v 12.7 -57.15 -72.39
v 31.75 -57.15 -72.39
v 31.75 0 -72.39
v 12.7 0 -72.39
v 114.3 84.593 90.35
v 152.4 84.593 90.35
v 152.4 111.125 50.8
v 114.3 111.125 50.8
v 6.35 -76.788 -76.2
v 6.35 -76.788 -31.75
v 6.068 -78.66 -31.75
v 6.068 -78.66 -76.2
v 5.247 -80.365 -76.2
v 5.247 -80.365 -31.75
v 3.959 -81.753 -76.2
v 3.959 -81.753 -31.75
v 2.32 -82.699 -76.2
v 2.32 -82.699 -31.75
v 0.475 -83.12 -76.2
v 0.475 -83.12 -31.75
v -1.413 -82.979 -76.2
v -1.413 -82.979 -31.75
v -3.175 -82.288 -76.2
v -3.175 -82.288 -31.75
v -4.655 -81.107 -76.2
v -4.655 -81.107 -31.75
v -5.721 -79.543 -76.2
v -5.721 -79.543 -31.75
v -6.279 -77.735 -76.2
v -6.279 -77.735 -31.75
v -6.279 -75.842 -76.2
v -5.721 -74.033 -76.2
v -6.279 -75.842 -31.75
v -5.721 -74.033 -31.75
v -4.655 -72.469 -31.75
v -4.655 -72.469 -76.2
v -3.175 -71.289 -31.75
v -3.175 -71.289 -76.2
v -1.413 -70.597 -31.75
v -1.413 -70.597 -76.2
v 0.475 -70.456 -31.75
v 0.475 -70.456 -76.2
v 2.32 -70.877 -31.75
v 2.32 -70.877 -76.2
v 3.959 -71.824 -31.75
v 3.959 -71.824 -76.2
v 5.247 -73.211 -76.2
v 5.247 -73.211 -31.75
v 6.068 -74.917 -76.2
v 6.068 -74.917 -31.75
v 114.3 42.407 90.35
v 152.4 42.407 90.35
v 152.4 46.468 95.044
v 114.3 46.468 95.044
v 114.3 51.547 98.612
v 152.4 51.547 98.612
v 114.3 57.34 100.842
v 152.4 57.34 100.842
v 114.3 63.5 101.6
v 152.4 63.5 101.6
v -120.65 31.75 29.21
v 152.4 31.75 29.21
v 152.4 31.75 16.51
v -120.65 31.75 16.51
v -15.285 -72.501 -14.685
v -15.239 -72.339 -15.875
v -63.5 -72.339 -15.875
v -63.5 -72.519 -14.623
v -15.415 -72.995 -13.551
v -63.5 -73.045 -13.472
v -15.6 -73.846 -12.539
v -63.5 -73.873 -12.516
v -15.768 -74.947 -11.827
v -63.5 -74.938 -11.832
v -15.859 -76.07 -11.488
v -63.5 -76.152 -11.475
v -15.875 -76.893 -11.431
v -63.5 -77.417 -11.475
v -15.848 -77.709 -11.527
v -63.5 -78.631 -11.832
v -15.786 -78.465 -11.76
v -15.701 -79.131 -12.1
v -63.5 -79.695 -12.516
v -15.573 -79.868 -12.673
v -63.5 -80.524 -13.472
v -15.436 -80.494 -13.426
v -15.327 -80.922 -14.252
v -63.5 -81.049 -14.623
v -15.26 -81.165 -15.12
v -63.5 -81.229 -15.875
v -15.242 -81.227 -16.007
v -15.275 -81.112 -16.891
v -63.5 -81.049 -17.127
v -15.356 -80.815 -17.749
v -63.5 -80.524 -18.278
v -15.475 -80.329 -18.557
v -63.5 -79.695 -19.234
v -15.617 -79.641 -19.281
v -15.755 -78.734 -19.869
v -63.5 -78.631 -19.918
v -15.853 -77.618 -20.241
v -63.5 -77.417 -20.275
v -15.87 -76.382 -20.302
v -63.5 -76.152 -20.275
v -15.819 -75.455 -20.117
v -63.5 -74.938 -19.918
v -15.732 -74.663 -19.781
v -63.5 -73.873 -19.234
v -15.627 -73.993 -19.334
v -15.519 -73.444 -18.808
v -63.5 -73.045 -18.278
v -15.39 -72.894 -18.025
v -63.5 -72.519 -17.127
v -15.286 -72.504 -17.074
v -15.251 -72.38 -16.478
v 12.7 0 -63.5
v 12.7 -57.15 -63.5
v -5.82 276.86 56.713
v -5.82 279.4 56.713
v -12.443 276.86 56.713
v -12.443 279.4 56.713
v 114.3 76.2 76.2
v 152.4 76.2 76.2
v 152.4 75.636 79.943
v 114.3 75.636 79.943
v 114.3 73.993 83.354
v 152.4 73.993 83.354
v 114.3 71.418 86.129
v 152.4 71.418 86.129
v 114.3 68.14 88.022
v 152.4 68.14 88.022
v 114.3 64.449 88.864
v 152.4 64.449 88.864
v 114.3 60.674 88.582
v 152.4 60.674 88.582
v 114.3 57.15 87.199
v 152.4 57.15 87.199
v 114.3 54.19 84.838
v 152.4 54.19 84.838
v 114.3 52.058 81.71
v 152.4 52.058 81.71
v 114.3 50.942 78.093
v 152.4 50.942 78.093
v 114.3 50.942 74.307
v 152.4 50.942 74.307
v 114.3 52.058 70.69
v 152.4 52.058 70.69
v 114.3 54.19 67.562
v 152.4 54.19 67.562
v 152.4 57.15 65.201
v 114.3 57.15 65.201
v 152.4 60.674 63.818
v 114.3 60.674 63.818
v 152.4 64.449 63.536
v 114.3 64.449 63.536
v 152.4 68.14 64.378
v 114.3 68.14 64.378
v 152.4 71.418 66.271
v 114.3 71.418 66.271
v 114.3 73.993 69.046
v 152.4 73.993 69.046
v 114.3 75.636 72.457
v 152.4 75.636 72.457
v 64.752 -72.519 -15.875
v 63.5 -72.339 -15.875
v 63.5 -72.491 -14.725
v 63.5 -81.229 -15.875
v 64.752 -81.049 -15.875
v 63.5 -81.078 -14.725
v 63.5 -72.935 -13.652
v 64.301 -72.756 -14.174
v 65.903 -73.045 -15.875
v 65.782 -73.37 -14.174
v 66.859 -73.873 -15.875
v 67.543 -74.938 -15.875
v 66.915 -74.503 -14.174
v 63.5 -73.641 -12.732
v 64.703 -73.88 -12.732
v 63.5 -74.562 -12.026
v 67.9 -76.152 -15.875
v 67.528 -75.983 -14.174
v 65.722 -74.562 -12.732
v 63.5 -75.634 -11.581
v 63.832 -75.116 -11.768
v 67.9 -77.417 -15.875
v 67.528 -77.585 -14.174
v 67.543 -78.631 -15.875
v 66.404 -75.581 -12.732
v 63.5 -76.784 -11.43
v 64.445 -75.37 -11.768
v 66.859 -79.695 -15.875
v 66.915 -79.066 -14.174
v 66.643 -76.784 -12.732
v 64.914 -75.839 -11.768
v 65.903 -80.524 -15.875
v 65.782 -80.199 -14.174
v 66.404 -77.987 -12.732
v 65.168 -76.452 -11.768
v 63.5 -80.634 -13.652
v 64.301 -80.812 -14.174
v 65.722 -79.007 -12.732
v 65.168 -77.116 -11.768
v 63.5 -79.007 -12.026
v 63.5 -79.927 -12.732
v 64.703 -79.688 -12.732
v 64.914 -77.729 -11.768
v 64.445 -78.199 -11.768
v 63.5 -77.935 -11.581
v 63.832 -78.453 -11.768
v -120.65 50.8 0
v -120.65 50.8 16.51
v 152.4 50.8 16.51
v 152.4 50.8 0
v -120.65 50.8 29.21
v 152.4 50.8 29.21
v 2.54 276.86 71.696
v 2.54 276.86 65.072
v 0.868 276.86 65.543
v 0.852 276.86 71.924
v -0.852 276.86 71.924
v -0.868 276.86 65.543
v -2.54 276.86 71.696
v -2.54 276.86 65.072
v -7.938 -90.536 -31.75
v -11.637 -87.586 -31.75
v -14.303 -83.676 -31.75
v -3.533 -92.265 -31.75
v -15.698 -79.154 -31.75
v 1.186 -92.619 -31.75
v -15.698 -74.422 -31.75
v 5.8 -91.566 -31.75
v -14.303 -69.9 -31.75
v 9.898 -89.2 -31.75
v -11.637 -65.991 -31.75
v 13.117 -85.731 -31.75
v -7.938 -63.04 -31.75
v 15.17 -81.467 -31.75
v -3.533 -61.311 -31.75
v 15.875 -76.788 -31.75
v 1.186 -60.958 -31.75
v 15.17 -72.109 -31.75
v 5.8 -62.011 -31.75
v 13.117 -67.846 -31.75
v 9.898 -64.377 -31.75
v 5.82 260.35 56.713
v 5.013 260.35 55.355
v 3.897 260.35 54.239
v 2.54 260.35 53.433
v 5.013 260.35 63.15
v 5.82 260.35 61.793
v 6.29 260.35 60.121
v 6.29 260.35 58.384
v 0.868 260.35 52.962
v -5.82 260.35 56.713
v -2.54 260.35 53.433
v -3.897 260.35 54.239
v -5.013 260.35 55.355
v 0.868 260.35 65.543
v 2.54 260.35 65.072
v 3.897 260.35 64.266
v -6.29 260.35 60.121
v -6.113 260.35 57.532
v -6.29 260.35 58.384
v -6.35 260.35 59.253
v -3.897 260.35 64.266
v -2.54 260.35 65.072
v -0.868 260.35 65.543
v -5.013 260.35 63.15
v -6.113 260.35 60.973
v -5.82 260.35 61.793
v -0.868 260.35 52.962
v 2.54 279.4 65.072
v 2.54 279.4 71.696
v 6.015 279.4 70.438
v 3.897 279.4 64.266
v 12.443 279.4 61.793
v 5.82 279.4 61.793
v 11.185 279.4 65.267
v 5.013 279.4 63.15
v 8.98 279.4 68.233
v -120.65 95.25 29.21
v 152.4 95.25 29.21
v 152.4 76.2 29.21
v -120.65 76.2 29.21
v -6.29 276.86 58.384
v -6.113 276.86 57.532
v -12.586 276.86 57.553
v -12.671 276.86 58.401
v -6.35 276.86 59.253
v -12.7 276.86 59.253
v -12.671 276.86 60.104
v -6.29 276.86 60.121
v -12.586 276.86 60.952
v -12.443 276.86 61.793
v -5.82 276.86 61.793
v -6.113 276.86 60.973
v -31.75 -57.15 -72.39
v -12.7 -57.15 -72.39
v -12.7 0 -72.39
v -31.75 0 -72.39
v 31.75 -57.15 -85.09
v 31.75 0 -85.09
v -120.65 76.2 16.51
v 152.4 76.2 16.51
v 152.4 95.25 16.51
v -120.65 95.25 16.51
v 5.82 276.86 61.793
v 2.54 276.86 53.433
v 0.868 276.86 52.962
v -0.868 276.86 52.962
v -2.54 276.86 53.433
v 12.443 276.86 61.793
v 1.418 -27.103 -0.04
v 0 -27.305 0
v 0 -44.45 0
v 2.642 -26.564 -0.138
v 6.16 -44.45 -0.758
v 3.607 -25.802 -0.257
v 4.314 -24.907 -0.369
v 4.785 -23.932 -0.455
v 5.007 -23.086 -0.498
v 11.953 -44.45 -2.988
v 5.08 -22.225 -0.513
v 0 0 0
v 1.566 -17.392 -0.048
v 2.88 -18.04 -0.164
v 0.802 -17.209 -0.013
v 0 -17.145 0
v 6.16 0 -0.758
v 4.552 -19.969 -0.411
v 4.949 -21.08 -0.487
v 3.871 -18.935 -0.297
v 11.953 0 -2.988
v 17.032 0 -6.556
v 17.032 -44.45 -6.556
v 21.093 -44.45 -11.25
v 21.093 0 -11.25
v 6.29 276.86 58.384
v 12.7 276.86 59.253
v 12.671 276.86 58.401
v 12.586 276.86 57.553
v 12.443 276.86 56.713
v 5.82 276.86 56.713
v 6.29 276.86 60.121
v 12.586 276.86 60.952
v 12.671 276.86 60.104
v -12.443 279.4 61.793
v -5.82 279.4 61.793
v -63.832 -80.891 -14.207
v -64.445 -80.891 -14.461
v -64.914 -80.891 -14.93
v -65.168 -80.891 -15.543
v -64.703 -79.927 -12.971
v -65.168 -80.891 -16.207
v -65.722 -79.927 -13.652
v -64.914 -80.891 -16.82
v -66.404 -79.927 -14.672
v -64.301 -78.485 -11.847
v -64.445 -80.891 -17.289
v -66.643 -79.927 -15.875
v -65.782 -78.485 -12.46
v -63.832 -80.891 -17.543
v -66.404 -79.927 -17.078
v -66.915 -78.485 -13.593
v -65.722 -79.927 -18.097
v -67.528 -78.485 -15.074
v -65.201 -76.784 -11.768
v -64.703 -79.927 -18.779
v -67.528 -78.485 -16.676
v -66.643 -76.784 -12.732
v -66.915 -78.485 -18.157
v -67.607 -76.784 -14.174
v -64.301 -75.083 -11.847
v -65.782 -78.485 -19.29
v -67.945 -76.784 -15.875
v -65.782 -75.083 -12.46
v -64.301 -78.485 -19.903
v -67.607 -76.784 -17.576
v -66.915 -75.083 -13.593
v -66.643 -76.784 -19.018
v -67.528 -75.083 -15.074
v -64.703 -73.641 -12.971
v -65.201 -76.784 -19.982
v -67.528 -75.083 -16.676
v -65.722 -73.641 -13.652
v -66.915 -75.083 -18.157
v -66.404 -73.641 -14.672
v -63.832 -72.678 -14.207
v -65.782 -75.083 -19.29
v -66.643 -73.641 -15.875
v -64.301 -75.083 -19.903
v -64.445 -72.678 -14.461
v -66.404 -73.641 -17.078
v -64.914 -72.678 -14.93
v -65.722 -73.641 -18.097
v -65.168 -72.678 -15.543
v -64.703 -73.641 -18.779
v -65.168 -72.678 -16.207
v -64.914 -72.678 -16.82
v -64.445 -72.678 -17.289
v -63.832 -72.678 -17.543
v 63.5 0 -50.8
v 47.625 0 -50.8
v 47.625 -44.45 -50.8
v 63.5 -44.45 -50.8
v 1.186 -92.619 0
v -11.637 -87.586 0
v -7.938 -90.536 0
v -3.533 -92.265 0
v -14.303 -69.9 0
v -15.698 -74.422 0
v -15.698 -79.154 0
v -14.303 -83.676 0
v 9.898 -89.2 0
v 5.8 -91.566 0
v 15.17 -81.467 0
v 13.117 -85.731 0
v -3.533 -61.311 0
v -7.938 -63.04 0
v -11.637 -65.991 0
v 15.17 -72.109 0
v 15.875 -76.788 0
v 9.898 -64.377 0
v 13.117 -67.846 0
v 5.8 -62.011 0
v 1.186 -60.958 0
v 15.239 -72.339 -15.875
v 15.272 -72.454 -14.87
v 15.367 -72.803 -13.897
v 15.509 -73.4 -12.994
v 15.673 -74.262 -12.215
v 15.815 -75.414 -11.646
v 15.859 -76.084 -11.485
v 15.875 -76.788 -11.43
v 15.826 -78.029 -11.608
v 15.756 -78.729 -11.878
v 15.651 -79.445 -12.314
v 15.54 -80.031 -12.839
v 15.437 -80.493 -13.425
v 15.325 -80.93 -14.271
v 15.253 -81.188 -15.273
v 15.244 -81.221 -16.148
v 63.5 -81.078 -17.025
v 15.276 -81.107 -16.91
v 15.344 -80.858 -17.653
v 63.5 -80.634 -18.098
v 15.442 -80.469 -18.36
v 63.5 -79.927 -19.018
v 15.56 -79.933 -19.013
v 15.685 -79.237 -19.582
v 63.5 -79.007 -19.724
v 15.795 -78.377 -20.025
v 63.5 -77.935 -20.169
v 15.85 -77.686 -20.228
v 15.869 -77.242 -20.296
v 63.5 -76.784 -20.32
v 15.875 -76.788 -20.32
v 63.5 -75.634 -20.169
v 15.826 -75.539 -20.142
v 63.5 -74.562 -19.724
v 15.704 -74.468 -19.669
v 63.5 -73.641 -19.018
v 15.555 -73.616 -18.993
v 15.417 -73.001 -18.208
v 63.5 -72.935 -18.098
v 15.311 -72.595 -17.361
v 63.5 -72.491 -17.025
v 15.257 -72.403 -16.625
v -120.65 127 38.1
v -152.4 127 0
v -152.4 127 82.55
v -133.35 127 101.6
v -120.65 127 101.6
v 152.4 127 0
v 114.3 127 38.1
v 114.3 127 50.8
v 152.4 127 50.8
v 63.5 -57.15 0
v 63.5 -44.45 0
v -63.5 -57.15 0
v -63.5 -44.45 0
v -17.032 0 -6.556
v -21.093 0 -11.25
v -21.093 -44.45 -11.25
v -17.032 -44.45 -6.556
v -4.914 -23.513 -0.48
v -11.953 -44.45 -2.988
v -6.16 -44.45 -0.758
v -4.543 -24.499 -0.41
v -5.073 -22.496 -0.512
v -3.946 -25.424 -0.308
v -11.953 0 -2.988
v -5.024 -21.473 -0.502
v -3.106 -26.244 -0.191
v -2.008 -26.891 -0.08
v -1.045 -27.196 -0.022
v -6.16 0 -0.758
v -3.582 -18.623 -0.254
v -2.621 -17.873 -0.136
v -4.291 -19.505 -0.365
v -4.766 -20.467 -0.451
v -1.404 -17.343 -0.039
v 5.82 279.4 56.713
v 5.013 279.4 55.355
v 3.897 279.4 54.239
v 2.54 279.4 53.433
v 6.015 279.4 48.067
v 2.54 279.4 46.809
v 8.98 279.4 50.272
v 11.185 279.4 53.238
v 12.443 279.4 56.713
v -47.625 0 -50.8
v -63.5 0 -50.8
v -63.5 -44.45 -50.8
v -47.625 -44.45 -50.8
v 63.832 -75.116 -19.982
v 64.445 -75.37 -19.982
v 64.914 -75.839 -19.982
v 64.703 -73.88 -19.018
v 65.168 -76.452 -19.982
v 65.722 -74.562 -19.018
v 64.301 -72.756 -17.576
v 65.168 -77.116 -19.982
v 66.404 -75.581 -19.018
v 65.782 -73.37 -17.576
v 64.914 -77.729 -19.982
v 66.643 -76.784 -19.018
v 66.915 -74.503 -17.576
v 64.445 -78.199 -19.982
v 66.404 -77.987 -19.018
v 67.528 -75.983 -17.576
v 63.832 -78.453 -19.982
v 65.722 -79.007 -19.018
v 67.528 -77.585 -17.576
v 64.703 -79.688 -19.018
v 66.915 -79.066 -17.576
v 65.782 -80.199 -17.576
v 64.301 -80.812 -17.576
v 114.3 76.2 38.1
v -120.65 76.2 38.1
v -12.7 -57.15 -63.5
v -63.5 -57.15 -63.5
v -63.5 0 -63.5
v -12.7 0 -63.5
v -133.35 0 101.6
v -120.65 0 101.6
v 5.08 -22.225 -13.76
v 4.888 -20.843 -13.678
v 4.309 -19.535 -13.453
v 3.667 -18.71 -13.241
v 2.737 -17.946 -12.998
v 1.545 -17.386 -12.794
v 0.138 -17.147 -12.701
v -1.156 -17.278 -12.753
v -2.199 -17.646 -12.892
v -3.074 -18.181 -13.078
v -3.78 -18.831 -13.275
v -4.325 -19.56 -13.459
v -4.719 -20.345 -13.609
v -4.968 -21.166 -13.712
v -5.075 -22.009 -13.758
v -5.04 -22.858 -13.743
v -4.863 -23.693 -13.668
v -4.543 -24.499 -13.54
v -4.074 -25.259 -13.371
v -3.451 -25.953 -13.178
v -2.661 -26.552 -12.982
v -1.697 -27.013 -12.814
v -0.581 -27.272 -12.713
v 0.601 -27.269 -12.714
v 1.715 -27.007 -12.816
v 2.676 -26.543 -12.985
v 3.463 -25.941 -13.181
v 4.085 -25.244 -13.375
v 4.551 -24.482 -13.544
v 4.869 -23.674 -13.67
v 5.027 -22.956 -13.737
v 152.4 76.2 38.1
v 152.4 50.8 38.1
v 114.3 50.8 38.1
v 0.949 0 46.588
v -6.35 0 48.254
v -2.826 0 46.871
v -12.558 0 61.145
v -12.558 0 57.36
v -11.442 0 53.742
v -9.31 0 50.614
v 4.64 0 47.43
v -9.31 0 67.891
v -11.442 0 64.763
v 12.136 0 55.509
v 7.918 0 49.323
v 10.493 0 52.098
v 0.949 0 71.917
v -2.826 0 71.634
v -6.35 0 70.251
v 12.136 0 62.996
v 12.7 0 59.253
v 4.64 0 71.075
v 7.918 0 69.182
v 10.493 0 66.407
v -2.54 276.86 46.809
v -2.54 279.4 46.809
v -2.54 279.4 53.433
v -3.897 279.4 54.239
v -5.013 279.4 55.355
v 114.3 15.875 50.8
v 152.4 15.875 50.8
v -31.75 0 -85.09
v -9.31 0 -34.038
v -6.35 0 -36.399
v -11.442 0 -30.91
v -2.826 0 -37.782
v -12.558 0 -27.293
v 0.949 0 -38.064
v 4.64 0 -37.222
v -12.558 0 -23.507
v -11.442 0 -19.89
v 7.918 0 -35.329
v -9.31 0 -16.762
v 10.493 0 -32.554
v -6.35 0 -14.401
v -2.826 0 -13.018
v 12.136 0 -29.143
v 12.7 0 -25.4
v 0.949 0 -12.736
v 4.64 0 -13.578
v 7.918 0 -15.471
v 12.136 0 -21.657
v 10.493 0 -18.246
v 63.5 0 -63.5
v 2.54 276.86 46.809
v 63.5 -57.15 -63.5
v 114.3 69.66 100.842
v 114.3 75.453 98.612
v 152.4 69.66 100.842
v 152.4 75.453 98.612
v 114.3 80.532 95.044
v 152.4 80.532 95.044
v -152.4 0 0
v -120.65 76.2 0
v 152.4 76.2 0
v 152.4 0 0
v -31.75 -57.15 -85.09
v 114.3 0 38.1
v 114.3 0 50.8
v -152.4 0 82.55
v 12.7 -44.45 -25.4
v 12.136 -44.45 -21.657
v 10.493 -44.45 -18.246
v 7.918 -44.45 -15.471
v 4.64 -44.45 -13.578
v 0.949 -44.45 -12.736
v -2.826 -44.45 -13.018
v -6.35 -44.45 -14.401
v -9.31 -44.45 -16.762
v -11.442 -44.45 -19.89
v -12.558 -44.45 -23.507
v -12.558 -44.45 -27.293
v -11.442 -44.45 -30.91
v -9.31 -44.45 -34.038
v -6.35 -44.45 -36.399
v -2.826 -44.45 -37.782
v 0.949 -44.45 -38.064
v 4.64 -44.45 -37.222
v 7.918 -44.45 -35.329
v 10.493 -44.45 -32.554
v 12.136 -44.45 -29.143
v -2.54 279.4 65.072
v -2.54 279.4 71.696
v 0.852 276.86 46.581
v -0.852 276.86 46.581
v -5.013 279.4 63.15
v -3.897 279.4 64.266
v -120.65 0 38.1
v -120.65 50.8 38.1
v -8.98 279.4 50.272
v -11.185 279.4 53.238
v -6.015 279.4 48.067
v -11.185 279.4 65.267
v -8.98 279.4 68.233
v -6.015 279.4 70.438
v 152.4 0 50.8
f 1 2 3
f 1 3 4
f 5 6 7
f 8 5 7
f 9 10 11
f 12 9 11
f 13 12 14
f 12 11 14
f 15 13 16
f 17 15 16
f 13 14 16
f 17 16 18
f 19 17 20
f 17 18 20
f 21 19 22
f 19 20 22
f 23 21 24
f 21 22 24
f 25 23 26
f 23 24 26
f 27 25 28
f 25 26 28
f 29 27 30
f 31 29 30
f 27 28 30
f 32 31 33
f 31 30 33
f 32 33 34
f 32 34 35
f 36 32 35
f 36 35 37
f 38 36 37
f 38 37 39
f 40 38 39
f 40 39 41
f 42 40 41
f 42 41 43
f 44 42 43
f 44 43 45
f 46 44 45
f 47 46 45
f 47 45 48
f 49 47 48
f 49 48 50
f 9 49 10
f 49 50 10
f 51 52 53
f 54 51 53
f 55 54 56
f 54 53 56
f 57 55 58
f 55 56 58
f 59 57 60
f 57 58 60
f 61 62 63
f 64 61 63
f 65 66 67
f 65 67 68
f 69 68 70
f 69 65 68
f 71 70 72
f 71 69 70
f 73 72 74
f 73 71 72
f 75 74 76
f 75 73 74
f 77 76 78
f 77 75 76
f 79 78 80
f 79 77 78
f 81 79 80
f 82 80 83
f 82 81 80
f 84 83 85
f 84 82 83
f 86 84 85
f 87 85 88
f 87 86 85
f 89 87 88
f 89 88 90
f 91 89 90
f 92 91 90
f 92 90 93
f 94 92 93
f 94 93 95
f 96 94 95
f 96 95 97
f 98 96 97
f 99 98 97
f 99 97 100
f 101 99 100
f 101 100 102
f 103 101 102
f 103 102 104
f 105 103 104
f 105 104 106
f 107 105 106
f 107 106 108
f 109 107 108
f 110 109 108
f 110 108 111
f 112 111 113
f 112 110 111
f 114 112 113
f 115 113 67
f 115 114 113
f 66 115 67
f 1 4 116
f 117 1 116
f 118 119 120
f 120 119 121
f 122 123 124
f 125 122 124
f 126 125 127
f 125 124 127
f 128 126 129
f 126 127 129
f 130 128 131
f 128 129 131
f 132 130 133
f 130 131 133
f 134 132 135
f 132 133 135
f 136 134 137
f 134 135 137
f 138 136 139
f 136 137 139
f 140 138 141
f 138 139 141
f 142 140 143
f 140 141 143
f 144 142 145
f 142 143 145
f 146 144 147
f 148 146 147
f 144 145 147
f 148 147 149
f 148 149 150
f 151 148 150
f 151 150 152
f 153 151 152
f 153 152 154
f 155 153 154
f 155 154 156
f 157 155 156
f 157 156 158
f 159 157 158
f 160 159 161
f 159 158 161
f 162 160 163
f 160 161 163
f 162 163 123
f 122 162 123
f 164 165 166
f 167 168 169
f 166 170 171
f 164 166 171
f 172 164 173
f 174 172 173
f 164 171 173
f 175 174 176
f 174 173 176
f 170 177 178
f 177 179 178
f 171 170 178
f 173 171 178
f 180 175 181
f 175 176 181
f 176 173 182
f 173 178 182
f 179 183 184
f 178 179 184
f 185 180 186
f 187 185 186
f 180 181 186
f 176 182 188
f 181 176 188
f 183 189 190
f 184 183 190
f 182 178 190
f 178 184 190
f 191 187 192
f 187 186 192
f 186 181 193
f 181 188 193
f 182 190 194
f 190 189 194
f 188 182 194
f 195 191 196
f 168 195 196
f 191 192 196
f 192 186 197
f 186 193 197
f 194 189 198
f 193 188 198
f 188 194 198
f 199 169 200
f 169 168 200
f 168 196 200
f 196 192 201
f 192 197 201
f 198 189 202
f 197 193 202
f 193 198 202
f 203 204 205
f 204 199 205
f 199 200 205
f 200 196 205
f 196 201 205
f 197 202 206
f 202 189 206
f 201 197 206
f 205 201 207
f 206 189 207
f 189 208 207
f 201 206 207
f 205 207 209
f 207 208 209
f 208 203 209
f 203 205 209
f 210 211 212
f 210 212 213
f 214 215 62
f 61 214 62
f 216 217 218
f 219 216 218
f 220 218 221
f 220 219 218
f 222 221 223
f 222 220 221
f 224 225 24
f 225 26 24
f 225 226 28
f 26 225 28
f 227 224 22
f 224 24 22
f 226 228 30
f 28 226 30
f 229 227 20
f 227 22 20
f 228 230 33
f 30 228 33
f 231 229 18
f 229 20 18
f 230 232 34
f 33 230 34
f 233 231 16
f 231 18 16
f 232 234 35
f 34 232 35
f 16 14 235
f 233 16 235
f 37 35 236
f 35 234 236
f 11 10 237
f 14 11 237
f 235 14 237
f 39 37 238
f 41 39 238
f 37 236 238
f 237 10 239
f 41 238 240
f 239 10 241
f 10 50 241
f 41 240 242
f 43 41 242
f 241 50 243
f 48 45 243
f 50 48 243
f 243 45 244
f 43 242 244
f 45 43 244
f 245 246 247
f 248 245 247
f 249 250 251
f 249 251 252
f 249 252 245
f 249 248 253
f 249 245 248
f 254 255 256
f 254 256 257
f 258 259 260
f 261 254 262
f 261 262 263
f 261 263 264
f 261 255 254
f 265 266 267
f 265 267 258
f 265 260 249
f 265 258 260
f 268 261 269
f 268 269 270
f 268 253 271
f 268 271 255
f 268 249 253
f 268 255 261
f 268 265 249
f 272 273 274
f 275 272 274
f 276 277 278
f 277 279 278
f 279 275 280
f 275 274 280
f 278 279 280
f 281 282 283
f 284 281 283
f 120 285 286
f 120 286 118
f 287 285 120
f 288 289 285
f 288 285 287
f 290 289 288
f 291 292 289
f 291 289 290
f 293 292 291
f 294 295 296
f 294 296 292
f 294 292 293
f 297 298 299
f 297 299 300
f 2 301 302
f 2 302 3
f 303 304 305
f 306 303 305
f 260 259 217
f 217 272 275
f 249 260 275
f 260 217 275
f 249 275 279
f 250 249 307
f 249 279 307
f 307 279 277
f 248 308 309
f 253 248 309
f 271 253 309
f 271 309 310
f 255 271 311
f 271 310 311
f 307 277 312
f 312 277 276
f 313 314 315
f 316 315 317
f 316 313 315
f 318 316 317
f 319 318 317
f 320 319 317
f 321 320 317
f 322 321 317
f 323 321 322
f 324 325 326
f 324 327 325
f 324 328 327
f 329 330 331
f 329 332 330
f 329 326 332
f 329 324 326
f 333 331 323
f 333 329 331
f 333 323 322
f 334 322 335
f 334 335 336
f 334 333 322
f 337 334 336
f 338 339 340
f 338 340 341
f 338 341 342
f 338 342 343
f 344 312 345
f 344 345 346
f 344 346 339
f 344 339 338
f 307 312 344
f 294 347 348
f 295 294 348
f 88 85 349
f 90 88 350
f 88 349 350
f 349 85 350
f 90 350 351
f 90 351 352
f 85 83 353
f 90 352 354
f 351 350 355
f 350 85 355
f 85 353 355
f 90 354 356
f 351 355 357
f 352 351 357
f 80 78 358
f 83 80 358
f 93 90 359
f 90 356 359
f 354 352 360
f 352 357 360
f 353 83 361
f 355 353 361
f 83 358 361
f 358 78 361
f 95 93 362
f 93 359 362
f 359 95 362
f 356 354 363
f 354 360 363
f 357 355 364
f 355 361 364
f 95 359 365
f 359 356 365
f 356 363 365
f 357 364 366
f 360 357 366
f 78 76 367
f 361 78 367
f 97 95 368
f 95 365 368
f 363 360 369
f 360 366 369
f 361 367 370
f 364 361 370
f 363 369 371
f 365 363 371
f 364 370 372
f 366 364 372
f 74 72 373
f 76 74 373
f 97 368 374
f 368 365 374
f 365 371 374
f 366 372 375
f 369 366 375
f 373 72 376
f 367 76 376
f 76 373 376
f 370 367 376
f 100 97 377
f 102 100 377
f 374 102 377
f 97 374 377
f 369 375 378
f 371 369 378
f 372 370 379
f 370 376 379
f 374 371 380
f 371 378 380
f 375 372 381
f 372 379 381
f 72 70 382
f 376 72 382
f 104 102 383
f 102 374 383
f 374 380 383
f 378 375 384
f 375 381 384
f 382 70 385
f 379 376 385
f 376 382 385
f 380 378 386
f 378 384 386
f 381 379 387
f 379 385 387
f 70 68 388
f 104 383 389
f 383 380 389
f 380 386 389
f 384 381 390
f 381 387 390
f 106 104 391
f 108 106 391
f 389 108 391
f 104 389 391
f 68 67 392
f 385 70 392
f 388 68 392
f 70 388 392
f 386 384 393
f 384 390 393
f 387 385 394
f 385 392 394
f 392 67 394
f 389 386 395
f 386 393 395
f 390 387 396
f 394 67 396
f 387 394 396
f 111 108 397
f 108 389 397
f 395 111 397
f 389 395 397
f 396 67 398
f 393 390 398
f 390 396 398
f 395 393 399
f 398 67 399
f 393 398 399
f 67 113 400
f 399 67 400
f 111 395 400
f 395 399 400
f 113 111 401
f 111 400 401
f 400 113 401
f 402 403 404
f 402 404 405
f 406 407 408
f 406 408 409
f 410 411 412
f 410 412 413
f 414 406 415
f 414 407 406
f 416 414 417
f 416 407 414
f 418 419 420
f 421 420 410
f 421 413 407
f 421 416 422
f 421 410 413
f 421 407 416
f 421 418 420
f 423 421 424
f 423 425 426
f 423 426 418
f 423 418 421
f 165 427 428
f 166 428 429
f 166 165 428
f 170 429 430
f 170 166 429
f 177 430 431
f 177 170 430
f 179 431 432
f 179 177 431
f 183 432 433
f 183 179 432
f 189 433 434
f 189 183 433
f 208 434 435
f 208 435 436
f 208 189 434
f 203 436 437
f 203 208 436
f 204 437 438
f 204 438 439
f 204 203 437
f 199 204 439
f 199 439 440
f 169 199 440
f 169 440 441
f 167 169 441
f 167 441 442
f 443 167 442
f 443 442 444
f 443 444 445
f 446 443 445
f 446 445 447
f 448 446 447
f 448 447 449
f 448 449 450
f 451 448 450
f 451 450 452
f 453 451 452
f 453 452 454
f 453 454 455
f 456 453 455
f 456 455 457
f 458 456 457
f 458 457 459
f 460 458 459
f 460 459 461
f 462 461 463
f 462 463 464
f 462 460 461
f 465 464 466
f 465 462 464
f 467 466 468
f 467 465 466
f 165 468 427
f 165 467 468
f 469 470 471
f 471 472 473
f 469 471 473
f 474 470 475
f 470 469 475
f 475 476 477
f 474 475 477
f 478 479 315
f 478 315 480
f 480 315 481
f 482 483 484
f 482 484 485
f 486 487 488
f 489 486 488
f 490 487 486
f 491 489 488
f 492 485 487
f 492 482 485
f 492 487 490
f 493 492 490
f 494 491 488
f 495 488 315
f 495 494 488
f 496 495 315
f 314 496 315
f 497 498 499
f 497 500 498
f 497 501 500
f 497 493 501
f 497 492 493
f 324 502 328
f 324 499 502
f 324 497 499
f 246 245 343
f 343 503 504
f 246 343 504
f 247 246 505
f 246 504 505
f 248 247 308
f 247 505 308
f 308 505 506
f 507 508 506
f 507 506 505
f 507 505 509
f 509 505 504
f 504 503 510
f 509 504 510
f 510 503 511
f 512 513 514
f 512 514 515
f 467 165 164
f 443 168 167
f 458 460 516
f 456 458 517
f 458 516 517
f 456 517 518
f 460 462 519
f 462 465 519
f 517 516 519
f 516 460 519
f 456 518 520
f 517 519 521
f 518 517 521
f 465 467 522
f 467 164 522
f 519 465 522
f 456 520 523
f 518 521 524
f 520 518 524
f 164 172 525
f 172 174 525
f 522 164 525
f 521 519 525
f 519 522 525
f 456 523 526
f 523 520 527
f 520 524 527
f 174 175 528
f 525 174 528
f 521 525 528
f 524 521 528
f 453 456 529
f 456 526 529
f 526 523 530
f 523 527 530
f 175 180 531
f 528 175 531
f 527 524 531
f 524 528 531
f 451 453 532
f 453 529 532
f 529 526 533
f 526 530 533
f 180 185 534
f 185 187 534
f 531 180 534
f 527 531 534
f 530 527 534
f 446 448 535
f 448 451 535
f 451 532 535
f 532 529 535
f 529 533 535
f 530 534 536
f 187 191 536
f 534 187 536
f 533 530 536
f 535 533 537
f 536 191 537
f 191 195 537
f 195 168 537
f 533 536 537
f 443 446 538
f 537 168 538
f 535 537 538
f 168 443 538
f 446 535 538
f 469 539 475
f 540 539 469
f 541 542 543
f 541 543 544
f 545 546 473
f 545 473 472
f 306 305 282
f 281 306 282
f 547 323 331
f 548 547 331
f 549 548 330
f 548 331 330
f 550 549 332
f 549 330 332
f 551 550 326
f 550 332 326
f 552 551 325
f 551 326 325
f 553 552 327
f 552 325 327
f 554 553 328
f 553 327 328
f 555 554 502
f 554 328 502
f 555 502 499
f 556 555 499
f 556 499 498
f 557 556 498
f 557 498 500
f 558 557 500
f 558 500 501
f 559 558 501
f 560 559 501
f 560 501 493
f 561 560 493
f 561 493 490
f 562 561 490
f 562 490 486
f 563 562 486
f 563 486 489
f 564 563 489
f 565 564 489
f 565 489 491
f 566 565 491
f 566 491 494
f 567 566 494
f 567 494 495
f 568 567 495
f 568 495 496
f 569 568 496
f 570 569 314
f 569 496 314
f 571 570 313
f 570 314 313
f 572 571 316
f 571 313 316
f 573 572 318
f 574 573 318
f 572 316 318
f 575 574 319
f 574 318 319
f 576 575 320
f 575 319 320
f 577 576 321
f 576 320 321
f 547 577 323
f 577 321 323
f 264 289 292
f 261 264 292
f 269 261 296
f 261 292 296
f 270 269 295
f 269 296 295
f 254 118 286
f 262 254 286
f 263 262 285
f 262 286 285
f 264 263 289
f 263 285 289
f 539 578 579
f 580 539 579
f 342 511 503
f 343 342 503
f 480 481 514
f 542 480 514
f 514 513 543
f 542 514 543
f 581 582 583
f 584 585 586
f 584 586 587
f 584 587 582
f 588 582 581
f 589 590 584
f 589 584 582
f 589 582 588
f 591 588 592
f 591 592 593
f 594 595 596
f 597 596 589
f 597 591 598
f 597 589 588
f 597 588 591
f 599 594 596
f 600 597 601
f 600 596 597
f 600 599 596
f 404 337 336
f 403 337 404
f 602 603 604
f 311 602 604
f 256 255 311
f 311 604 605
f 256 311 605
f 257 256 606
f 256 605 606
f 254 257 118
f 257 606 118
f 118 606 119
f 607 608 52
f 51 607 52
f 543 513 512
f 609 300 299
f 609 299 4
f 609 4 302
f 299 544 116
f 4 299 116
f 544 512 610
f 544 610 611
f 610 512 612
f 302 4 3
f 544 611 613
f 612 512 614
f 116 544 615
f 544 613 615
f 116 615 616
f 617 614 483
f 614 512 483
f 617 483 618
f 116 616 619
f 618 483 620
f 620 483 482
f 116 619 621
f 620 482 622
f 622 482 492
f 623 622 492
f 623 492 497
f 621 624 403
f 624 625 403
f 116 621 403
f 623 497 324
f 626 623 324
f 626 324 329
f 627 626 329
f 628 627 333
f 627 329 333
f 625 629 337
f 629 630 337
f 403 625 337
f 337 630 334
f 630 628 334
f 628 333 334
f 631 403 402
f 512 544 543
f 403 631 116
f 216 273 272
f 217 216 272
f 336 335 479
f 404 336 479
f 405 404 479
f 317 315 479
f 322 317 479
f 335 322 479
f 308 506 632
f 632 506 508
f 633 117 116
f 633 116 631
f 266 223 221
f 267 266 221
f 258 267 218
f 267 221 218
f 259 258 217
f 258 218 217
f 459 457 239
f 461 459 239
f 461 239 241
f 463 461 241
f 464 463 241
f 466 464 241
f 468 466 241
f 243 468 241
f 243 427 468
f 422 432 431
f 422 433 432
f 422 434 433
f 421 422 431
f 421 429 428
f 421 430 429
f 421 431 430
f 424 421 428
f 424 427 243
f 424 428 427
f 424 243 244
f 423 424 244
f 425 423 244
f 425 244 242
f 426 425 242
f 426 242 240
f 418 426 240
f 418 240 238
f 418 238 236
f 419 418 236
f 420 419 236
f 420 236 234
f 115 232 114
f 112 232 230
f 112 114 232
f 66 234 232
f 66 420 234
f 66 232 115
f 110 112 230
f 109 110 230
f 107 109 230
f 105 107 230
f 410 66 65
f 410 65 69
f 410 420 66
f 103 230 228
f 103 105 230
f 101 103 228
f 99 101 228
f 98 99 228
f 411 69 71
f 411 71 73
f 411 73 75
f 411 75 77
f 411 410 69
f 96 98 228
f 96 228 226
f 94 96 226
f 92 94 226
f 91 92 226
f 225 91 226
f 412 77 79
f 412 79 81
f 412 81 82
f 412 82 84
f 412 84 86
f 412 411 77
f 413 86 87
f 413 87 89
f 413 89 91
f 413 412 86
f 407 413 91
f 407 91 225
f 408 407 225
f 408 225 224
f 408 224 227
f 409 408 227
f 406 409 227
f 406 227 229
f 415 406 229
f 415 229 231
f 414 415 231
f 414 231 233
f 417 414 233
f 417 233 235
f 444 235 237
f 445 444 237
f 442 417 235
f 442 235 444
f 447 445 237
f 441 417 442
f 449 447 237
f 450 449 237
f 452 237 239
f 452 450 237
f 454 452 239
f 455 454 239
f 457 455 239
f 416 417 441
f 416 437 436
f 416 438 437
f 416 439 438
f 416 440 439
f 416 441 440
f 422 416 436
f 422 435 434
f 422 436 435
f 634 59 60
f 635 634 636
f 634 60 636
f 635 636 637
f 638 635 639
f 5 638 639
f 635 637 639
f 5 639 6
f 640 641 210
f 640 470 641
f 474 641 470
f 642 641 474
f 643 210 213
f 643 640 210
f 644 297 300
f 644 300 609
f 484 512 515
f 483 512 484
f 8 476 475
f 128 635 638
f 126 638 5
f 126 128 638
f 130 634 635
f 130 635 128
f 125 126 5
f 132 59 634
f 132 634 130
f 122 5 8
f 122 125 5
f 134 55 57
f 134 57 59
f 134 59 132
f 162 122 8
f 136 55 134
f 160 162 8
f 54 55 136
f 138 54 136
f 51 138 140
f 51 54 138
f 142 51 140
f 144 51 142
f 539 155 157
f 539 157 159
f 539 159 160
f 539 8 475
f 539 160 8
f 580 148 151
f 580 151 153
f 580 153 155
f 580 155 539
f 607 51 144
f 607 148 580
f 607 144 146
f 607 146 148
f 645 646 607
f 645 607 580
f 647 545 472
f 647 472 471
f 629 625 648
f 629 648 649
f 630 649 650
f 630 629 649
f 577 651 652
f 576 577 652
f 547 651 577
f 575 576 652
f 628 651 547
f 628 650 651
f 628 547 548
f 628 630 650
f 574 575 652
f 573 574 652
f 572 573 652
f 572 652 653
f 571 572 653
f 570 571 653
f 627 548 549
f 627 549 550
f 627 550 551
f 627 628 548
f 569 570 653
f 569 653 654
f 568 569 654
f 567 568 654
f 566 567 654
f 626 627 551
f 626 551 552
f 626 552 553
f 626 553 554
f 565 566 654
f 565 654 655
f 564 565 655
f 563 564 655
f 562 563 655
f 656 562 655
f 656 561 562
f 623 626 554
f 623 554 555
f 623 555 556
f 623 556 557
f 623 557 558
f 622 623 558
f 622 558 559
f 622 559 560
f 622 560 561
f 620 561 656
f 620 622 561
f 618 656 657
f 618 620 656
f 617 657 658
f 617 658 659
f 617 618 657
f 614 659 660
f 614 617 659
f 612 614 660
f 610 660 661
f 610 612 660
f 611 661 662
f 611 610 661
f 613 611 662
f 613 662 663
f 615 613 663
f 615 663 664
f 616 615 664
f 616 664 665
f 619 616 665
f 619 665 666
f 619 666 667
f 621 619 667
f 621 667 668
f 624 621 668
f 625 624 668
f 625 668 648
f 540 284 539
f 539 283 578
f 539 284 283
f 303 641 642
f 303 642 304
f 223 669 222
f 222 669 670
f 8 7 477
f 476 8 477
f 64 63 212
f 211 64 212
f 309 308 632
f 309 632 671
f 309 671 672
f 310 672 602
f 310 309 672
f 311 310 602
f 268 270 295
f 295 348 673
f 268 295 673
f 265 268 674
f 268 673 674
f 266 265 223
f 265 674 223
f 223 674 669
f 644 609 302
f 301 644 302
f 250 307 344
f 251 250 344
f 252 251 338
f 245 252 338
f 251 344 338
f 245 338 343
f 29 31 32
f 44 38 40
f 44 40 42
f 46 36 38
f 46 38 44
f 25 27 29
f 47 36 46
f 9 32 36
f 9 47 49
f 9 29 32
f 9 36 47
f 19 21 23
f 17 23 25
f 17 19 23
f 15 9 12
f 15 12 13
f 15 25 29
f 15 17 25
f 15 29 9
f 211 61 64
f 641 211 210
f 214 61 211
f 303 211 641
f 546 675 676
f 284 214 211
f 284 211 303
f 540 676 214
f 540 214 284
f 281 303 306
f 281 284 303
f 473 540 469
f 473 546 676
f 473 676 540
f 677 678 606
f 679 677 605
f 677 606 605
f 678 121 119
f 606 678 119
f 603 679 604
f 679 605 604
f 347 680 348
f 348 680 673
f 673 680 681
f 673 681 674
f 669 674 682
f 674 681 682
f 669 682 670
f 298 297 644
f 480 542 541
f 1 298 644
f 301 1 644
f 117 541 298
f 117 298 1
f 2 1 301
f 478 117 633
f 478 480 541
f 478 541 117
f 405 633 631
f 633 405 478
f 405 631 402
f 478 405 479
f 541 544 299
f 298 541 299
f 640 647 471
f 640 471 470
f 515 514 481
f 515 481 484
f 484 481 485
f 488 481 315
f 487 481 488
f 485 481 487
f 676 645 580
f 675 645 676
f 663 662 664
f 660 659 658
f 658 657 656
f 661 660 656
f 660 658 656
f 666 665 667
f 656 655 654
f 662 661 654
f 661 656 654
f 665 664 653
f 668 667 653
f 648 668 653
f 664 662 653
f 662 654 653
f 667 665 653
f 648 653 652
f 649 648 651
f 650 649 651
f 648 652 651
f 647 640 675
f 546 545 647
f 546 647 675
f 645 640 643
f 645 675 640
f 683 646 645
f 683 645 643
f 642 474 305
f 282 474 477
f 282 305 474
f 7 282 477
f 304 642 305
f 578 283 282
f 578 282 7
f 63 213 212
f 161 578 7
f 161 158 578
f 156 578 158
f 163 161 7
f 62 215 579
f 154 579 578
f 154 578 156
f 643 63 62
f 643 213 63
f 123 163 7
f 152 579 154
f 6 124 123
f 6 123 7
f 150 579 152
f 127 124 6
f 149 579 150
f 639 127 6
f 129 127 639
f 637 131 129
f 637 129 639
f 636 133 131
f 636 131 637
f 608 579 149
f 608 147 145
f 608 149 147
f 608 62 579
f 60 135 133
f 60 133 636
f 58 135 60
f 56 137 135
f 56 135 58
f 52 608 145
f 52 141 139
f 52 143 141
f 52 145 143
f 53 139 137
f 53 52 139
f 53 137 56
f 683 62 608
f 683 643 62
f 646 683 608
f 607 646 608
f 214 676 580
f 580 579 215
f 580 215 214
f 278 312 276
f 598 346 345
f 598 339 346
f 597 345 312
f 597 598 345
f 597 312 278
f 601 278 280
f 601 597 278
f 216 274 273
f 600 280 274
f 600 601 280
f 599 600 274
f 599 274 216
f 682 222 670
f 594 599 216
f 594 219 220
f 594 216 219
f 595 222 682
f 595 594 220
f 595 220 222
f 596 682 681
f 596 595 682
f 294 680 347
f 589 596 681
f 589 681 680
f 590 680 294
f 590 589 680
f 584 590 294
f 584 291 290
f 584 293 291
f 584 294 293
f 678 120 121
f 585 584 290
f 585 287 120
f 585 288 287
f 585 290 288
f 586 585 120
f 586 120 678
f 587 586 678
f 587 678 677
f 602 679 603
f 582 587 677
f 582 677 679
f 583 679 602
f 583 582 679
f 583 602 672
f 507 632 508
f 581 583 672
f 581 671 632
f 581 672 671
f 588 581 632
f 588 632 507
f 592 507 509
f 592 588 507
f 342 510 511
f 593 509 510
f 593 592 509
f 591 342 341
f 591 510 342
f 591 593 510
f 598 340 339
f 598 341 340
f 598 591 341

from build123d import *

# Parameters (mm, degrees)
F1_DEPTH  = 127
F2_R      = 12.7
F3_DEPTH  = 38.1
F4_DEPTH  = 273.05
F5_R      = 12.7
F6_DEPTH  = 57.15
F7_R      = 5.08
F8_DEPTH  = 31.75
F9_DEPTH  = 44.45
F10_DEPTH = 44.45
F11_R     = 12.7
F12_DEPTH = 279.4
F14_DEPTH = 19.05
F15_DEPTH = 2.54
F16_R     = 15.875
F17_DEPTH = 31.75
F18_R     = 6.35
F19_DEPTH = 44.45
F20_R     = 4.445
F21_DEPTH = 127


with BuildPart() as f1:
    # F0 (on Front) → F1 (new body)
    with BuildSketch(Plane.XZ):
        Polygon((-152.4, 82.55), (-152.4, 0), (152.4, 0), (152.4, 101.6), (114.3, 101.6), (114.3, 38.1), (-120.65, 38.1), (-120.65, 101.6), (-133.35, 101.6), align=None)
    extrude(amount=-F1_DEPTH)

    # F2 (on face) → F3 (cut, through all)
    with BuildSketch(Plane.YZ.offset(152.4)):
        with BuildLine():
            Line((0, 101.6), (0, 50.8))
            Line((0, 50.8), (15.875, 50.8))
            Line((15.875, 50.8), (42.4065743945, 90.3501730104))
            ThreePointArc((42.4065743945, 90.3501730104), (51.5470588235, 98.6117647059), (63.5, 101.6))
            Line((63.5, 101.6), (0, 101.6))
        make_face()
        with BuildLine():
            Line((127, 101.6), (63.5, 101.6))
            ThreePointArc((63.5, 101.6), (75.4529411765, 98.6117647059), (84.5934256055, 90.3501730104))
            Line((84.5934256055, 90.3501730104), (111.125, 50.8))
            Line((111.125, 50.8), (127, 50.8))
            Line((127, 50.8), (127, 101.6))
        make_face()
        with Locations((63.5, 76.2)):
            Circle(F2_R)
    extrude(amount=-F3_DEPTH, mode=Mode.SUBTRACT)

    # F2 (on face) → F4 (cut, through all)
    with BuildSketch(Plane.YZ.offset(152.4)):
        Polygon((50.8, 16.51), (50.8, 0), (76.2, 0), (76.2, 16.51), (95.25, 16.51), (95.25, 29.21), (76.2, 29.21), (76.2, 38.1), (50.8, 38.1), (50.8, 29.21), (31.75, 29.21), (31.75, 16.51), align=None)
    extrude(amount=-F4_DEPTH, mode=Mode.SUBTRACT)


with BuildPart() as f6:
    # F5 (on Front) → F6 (new body)
    with BuildSketch(Plane.XZ):
        with BuildLine():
            Line((-63.5, -50.8), (-63.5, -63.5))
            Line((-63.5, -63.5), (-12.7, -63.5))
            Line((-12.7, -63.5), (-12.7, -72.39))
            Line((-12.7, -72.39), (-31.75, -72.39))
            Line((-31.75, -72.39), (-31.75, -85.09))
            Line((-31.75, -85.09), (31.75, -85.09))
            Line((31.75, -85.09), (31.75, -72.39))
            Line((31.75, -72.39), (12.7, -72.39))
            Line((12.7, -72.39), (12.7, -63.5))
            Line((12.7, -63.5), (63.5, -63.5))
            Line((63.5, -63.5), (63.5, -50.8))
            Line((63.5, -50.8), (47.625, -50.8))
            Line((47.625, -50.8), (21.0934256055, -11.2498269896))
            ThreePointArc((21.0934256055, -11.2498269896), (11.9529411765, -2.9882352941), (0, 0))
            ThreePointArc((0, 0), (-11.9529411765, -2.9882352941), (-21.0934256055, -11.2498269896))
            Line((-21.0934256055, -11.2498269896), (-47.625, -50.8))
            Line((-47.625, -50.8), (-63.5, -50.8))
        make_face()
        with Locations((0, -25.4)):
            Circle(F5_R, mode=Mode.SUBTRACT)
        with BuildLine():
            Line((-63.5, 0), (-63.5, -50.8))
            Line((-63.5, -50.8), (-47.625, -50.8))
            Line((-47.625, -50.8), (-21.0934256055, -11.2498269896))
            ThreePointArc((-21.0934256055, -11.2498269896), (-11.9529411765, -2.9882352941), (0, 0))
            Line((0, 0), (-63.5, 0))
        make_face()
        with BuildLine():
            Line((63.5, 0), (0, 0))
            ThreePointArc((0, 0), (11.9529411765, -2.9882352941), (21.0934256055, -11.2498269896))
            Line((21.0934256055, -11.2498269896), (47.625, -50.8))
            Line((47.625, -50.8), (63.5, -50.8))
            Line((63.5, -50.8), (63.5, 0))
        make_face()
        with Locations((0, -25.4)):
            Circle(F5_R)
    extrude(amount=F6_DEPTH)

    # F7 (on face) → F8 (cut)
    with BuildSketch(Plane.XY):
        with Locations((0, -22.225)):
            Circle(F7_R)
    extrude(amount=-F8_DEPTH, mode=Mode.SUBTRACT)

    # F5 (on Front) → F9 (cut)
    with BuildSketch(Plane.XZ):
        with BuildLine():
            Line((63.5, 0), (0, 0))
            ThreePointArc((0, 0), (11.9529411765, -2.9882352941), (21.0934256055, -11.2498269896))
            Line((21.0934256055, -11.2498269896), (47.625, -50.8))
            Line((47.625, -50.8), (63.5, -50.8))
            Line((63.5, -50.8), (63.5, 0))
        make_face()
        with BuildLine():
            Line((-63.5, 0), (-63.5, -50.8))
            Line((-63.5, -50.8), (-47.625, -50.8))
            Line((-47.625, -50.8), (-21.0934256055, -11.2498269896))
            ThreePointArc((-21.0934256055, -11.2498269896), (-11.9529411765, -2.9882352941), (0, 0))
            Line((0, 0), (-63.5, 0))
        make_face()
    extrude(amount=F9_DEPTH, mode=Mode.SUBTRACT)

    # F5 (on Front) → F10 (cut)
    with BuildSketch(Plane.XZ):
        with Locations((0, -25.4)):
            Circle(F5_R)
    extrude(amount=F10_DEPTH, mode=Mode.SUBTRACT)


with BuildPart() as f12:
    # F11 (on Front) → F12 (new body)
    with BuildSketch(Plane.XZ):
        with Locations((0, 59.2525709756)):
            Circle(F11_R)
    extrude(amount=-F12_DEPTH)

    # F13 (on face) → F14 (cut)
    with BuildSketch(Plane(origin=(0, 279.4, 0), x_dir=(-1, 0, 0), z_dir=(0, 1, 0))):
        with BuildLine():
            ThreePointArc((5.8198711326, 56.7125709756), (6.2160550871, 57.9552047381), (6.35, 59.2525709756))
            ThreePointArc((6.35, 59.2525709756), (6.2160550871, 60.549937213), (5.8198711326, 61.7925709756))
            ThreePointArc((5.8198711326, 61.7925709756), (4.4901280605, 63.7426990361), (2.54, 65.0724421082))
            ThreePointArc((2.54, 65.0724421082), (0, 65.6025709756), (-2.54, 65.0724421082))
            ThreePointArc((-2.54, 65.0724421082), (-4.4901280605, 63.7426990361), (-5.8198711326, 61.7925709756))
            ThreePointArc((-5.8198711326, 61.7925709756), (-6.35, 59.2525709756), (-5.8198711326, 56.7125709756))
            ThreePointArc((-5.8198711326, 56.7125709756), (-4.4901280605, 54.762442915), (-2.54, 53.432699843))
            ThreePointArc((-2.54, 53.432699843), (0, 52.9025709756), (2.54, 53.432699843))
            ThreePointArc((2.54, 53.432699843), (4.4901280605, 54.762442915), (5.8198711326, 56.7125709756))
        make_face()
    extrude(amount=-F14_DEPTH, mode=Mode.SUBTRACT)

    # F13 (on face) → F15 (cut)
    with BuildSketch(Plane(origin=(0, 279.4, 0), x_dir=(-1, 0, 0), z_dir=(0, 1, 0))):
        with BuildLine():
            ThreePointArc((5.8198711326, 61.7925709756), (6.2160550871, 60.549937213), (6.35, 59.2525709756))
            ThreePointArc((6.35, 59.2525709756), (6.2160550871, 57.9552047381), (5.8198711326, 56.7125709756))
            Line((5.8198711326, 56.7125709756), (12.4434078933, 56.7125709756))
            ThreePointArc((12.4434078933, 56.7125709756), (12.6356891432, 57.9761071581), (12.7, 59.2525709756))
            ThreePointArc((12.7, 59.2525709756), (12.6356891432, 60.529034793), (12.4434078933, 61.7925709756))
            Line((12.4434078933, 61.7925709756), (5.8198711326, 61.7925709756))
        make_face()
        with BuildLine():
            Line((2.54, 46.8091630822), (2.54, 53.432699843))
            ThreePointArc((2.54, 53.432699843), (0, 52.9025709756), (-2.54, 53.432699843))
            Line((-2.54, 53.432699843), (-2.54, 46.8091630822))
            ThreePointArc((-2.54, 46.8091630822), (0, 46.5525709756), (2.54, 46.8091630822))
        make_face()
        with BuildLine():
            ThreePointArc((-5.8198711326, 56.7125709756), (-6.35, 59.2525709756), (-5.8198711326, 61.7925709756))
            Line((-5.8198711326, 61.7925709756), (-12.4434078933, 61.7925709756))
            ThreePointArc((-12.4434078933, 61.7925709756), (-12.7, 59.2525709756), (-12.4434078933, 56.7125709756))
            Line((-12.4434078933, 56.7125709756), (-5.8198711326, 56.7125709756))
        make_face()
        with BuildLine():
            ThreePointArc((-2.54, 65.0724421082), (0, 65.6025709756), (2.54, 65.0724421082))
            Line((2.54, 65.0724421082), (2.54, 71.6959788689))
            ThreePointArc((2.54, 71.6959788689), (0, 71.9525709756), (-2.54, 71.6959788689))
            Line((-2.54, 71.6959788689), (-2.54, 65.0724421082))
        make_face()
    extrude(amount=-F15_DEPTH, mode=Mode.SUBTRACT)


with BuildPart() as f17:
    # F16 (on Top) → F17 (new body)
    with BuildSketch(Plane.XY):
        with Locations((0, -76.7882447423)):
            Circle(F16_R)
    extrude(amount=-F17_DEPTH)

    # F18 (on face) → F19 (join)
    with BuildSketch(Plane(origin=(0, 0, -31.75), x_dir=(1, 0, 0), z_dir=(0, 0, -1))):
        with Locations((0, 76.7882447423)):
            Circle(F18_R)
    extrude(amount=F19_DEPTH)

    # F20 (on face) → F21 (join)
    with BuildSketch(Plane.YZ.offset(63.5)):
        with Locations((-76.7842, -15.875)):
            Circle(F20_R)
    extrude(amount=-F21_DEPTH)

    # F22 (on face) → F23 (revolve)
    with BuildSketch(Plane.YZ.offset(63.5)):
        with BuildLine():
            ThreePointArc((-72.3392, -15.875), (-73.6411103576, -12.7319103576), (-76.7842, -11.43))
            Line((-76.7842, -11.43), (-76.7842, -20.32))
            ThreePointArc((-76.7842, -20.32), (-73.6411103576, -19.0180896424), (-72.3392, -15.875))
        make_face()
    revolve(axis=Axis((63.5, -76.7842, -15.875), (0, 0, -1)))

    # F24 (on face) → F25 (revolve)
    with BuildSketch(Plane(origin=(-63.5, 0, 0), x_dir=(0, -1, 0), z_dir=(-1, 0, 0))):
        with BuildLine():
            ThreePointArc((81.2292, -15.875), (76.7842, -11.43), (72.3392, -15.875))
            Line((72.3392, -15.875), (81.2292, -15.875))
        make_face()
    revolve(axis=Axis((-63.5, -76.7159111088, -15.875), (0, -1, 0)))


solid = Compound([f1.part, f6.part, f12.part, f17.part])
